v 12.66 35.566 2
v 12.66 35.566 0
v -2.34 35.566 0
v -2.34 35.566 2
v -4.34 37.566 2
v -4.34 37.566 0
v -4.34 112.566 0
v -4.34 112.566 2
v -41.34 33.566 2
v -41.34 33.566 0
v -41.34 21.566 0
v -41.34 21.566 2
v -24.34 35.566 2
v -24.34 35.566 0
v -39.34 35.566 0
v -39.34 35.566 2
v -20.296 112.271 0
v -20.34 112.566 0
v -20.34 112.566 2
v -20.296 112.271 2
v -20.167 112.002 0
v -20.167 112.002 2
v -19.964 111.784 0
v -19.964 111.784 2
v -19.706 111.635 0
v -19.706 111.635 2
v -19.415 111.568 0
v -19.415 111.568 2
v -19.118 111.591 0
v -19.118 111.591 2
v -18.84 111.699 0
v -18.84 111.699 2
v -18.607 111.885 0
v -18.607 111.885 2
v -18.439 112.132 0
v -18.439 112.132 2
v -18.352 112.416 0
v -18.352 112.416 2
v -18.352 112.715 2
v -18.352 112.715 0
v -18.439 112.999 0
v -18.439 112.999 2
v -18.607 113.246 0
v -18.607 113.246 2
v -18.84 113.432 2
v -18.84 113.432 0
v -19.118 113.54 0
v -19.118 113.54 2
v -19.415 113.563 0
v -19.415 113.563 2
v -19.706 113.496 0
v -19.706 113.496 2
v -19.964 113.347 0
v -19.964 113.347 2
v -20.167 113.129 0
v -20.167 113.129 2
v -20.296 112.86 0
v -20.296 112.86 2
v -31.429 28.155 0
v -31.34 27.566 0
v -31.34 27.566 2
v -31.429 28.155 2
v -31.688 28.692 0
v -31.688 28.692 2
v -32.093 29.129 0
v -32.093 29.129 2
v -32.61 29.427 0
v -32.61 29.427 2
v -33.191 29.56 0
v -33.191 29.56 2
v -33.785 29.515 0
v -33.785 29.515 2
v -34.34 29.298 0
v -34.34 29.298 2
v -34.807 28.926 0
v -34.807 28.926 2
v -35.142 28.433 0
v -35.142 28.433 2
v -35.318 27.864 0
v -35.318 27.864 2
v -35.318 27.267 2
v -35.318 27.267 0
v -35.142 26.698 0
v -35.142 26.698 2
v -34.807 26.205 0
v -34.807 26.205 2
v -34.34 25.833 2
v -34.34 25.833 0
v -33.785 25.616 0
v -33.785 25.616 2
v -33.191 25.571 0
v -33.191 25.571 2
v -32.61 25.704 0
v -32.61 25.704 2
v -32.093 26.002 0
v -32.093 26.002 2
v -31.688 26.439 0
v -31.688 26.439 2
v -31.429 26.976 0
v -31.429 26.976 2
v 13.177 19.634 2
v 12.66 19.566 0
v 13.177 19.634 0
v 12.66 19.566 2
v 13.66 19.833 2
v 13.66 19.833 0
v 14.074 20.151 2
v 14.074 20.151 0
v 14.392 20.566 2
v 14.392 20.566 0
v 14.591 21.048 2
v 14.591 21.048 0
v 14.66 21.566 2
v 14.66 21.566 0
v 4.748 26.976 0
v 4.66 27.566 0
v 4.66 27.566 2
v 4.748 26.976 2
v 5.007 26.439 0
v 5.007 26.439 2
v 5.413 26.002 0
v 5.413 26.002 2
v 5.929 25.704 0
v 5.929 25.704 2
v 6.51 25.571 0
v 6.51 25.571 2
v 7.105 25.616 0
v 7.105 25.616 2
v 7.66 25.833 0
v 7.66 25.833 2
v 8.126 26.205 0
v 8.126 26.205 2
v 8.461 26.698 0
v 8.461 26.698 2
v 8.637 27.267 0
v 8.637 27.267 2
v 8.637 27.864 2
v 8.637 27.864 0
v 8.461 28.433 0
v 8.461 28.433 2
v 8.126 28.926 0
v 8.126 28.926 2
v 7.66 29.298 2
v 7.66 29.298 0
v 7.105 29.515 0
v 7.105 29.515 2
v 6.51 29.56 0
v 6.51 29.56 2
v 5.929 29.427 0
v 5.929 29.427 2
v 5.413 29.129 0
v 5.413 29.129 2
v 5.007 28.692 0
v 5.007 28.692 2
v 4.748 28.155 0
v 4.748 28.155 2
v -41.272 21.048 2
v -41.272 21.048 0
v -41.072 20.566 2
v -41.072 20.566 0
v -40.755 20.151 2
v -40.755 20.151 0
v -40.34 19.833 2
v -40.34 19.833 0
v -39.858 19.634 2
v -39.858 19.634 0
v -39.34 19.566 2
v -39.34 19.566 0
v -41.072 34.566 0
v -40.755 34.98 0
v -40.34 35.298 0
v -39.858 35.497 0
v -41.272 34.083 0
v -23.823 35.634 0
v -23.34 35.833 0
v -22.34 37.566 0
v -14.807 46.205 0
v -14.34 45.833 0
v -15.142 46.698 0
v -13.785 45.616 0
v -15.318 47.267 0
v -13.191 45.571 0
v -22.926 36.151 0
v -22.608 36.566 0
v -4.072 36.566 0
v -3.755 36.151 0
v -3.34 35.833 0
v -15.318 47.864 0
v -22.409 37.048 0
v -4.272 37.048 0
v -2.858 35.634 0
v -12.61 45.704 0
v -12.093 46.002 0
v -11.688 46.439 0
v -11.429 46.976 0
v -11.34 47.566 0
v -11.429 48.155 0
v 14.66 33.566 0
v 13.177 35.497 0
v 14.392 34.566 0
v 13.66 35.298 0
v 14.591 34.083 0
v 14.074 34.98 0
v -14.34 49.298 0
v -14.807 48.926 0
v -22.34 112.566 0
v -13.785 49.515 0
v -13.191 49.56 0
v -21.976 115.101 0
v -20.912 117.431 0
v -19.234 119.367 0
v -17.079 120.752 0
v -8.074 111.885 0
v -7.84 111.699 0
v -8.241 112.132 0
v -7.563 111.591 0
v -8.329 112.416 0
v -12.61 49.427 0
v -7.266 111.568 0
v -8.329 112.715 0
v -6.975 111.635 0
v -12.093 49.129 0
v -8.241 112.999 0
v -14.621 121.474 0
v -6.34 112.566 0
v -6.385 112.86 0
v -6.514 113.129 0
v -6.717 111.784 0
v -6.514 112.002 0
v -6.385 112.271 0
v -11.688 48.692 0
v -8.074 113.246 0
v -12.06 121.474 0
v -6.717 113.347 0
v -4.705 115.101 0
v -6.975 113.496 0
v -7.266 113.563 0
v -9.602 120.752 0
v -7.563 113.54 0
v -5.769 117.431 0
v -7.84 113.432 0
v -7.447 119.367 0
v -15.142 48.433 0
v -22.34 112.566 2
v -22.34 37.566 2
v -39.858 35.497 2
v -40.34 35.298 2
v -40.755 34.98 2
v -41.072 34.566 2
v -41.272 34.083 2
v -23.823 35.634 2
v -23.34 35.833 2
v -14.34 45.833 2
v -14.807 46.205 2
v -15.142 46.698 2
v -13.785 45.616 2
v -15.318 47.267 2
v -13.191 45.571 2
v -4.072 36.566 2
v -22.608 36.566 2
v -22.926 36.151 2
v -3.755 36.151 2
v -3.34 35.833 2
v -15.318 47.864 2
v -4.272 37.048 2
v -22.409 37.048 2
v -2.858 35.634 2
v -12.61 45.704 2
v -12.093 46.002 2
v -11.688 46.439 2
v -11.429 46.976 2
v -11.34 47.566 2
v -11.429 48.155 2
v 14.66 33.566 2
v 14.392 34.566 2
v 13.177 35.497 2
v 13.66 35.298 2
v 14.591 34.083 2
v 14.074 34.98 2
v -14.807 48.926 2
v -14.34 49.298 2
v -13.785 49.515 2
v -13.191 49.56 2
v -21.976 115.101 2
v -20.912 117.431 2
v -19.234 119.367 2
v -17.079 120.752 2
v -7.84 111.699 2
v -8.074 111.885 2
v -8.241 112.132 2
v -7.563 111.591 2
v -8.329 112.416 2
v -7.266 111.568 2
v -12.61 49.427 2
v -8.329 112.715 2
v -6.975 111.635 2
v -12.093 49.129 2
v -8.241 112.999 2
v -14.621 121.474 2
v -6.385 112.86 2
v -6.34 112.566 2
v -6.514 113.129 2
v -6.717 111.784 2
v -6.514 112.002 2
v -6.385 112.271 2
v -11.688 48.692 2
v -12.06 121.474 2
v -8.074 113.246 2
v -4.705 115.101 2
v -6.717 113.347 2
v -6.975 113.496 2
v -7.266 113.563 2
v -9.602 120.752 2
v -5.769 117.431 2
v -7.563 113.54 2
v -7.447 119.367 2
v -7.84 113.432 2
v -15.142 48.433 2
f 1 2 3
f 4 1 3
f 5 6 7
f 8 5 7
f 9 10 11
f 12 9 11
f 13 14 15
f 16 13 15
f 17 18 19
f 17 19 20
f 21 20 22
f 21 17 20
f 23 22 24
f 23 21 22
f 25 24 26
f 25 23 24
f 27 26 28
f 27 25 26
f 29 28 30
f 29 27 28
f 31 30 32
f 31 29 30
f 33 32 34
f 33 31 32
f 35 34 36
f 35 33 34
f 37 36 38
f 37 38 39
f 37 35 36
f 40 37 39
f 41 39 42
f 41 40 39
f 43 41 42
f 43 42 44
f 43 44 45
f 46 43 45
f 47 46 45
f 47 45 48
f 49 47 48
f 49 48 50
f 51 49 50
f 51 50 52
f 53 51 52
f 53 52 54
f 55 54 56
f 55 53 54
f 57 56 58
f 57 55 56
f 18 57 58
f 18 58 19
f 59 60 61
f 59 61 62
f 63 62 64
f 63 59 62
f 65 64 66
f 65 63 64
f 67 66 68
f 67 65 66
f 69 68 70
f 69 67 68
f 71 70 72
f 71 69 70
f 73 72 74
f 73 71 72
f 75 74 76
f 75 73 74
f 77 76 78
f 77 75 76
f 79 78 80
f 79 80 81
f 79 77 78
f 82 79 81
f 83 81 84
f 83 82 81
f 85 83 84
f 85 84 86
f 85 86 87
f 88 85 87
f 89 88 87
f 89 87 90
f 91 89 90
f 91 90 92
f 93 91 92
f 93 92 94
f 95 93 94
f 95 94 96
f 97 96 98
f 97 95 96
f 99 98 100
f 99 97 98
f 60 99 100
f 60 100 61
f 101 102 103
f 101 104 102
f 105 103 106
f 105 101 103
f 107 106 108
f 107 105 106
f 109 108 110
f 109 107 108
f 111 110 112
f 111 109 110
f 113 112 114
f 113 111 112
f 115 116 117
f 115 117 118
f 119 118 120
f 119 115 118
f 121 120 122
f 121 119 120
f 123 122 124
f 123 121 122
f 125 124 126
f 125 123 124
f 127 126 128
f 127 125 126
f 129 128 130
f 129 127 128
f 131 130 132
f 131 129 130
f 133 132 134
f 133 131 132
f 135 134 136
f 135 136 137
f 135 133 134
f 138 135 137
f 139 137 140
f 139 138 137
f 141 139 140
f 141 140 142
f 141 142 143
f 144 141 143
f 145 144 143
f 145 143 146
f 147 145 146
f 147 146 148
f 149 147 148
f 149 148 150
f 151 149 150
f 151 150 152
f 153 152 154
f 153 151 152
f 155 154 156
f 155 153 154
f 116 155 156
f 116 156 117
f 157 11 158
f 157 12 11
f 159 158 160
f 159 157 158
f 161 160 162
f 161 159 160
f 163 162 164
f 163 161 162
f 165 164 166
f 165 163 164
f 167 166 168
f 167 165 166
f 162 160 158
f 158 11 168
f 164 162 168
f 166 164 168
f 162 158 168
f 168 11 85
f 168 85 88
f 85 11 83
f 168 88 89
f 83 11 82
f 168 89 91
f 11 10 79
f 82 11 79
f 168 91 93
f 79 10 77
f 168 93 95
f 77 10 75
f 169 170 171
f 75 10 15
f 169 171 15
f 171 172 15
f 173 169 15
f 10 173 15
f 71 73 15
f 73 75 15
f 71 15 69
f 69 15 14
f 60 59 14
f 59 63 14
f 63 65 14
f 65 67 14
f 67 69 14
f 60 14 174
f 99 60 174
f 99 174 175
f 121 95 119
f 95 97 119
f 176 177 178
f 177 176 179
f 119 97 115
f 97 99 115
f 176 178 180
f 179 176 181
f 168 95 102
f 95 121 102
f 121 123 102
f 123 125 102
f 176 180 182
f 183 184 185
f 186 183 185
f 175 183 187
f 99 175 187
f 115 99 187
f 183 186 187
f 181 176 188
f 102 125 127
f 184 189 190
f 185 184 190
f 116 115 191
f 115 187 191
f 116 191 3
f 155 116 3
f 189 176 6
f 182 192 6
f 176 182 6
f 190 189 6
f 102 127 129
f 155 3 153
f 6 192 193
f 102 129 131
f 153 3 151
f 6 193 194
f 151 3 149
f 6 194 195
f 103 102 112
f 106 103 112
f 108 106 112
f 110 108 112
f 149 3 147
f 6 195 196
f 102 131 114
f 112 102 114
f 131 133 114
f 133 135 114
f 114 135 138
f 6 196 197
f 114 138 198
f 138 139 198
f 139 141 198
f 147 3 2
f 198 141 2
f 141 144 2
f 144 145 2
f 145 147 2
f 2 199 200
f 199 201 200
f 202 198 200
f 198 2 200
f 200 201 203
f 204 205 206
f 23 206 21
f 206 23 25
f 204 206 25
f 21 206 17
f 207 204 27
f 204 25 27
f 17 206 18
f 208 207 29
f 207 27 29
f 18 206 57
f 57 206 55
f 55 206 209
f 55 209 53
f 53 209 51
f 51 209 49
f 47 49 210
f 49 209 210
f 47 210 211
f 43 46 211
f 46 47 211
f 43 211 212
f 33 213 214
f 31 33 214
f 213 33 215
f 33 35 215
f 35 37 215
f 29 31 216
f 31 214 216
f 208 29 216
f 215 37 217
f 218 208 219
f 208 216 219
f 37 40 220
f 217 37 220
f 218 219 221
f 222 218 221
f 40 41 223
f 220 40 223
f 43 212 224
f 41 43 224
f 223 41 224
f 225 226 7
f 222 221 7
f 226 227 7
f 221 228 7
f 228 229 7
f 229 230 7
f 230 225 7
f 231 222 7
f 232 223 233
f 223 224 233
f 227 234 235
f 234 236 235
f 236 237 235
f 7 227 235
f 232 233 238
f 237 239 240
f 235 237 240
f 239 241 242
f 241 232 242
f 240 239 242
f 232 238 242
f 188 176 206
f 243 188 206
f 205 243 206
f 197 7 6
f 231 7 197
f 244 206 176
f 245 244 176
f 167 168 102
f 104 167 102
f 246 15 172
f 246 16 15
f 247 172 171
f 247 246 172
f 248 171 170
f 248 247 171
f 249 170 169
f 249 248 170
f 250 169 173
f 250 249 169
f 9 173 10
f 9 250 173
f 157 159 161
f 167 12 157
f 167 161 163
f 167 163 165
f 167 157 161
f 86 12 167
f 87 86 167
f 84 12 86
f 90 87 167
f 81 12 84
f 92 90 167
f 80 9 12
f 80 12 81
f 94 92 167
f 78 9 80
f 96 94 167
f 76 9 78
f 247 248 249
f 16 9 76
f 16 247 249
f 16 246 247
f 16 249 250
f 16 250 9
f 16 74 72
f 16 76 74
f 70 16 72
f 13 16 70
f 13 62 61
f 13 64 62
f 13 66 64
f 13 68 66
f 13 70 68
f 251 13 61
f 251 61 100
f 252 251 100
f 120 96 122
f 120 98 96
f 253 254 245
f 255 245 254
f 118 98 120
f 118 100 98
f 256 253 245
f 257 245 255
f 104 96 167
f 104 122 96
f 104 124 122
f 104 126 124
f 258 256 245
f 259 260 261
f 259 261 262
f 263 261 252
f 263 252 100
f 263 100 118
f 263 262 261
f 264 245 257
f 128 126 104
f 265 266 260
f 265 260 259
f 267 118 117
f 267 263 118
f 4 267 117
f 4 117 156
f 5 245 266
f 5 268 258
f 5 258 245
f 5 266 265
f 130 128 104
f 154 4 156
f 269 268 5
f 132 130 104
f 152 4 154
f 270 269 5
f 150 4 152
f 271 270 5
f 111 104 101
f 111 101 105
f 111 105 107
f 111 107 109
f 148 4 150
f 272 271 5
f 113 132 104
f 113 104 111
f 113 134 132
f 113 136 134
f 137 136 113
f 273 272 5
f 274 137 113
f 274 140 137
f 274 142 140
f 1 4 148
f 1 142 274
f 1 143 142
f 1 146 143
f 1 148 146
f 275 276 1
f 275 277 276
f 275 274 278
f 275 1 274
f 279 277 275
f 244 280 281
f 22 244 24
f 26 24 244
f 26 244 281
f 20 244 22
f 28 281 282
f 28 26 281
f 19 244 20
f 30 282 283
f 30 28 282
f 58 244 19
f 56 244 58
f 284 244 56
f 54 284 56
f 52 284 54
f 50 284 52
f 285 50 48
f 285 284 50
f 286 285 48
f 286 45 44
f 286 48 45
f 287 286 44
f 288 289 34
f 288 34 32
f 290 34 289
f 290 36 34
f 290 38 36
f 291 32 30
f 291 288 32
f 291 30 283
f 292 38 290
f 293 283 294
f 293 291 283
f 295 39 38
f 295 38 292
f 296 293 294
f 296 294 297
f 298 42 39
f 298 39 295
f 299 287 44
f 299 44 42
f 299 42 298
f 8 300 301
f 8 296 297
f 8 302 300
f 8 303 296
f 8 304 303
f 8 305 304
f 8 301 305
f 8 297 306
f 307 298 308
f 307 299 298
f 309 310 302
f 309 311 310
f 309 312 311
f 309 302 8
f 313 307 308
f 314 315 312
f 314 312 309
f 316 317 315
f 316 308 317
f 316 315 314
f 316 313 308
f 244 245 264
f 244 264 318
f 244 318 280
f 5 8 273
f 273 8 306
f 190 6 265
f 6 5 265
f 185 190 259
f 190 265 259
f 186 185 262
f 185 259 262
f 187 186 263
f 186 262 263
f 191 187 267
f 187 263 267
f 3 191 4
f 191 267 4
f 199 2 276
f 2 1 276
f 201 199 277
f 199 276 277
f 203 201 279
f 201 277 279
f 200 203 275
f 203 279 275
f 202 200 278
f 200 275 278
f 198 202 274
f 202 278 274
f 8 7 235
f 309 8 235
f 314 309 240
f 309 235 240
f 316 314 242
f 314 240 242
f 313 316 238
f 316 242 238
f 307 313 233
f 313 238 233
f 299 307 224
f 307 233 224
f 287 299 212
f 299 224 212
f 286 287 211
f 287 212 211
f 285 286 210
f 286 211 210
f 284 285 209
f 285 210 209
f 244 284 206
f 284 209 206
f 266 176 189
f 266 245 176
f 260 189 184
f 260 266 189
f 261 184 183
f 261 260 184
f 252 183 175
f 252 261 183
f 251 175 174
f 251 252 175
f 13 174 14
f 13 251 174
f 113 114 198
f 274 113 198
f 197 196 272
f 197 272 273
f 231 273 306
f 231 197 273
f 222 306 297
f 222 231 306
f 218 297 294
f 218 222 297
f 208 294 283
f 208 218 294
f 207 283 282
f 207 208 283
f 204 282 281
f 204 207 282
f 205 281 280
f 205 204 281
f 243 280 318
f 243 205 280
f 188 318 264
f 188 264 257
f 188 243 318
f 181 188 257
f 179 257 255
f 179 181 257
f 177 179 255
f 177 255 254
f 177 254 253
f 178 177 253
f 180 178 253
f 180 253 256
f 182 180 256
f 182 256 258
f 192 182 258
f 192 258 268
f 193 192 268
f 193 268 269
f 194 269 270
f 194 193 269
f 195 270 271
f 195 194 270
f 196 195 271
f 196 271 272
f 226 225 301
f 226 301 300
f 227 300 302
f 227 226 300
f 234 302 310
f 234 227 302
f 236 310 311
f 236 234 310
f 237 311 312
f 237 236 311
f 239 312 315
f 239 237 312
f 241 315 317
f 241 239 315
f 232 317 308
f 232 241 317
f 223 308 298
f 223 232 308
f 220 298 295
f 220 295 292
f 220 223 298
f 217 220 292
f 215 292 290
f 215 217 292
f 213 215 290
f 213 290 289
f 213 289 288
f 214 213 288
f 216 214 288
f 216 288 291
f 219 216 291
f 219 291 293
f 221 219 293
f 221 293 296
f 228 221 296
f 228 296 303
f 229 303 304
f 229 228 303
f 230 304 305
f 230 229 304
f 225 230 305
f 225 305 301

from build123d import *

# Parameters (mm, degrees)
SKETCH_1_R      = 2
SKETCH_1_R_2    = 1
EXTRUDE_1_DEPTH = 2
FILLET_1_R      = 2


with BuildPart() as part:
    # 草图1 → 凸台-拉伸1 (new body)
    with BuildSketch(Plane.XY):
        with BuildLine():
            Line((-22.340449028, 112.565520938), (-22.340449028, 35.565520938))
            Line((-22.340449028, 35.565520938), (-41.340449028, 35.565520938))
            Line((-41.340449028, 35.565520938), (-41.340449028, 19.565520938))
            Line((-41.340449028, 19.565520938), (14.659550972, 19.565520938))
            Line((14.659550972, 19.565520938), (14.659550972, 35.565520938))
            Line((14.659550972, 35.565520938), (-4.340449028, 35.565520938))
            Line((-4.340449028, 35.565520938), (-4.340449028, 112.565520938))
            ThreePointArc((-4.340449028, 112.565520938), (-13.340449028, 121.565520938), (-22.340449028, 112.565520938))
        make_face()
        with Locations((-33.340449028, 27.565520938)):
            Circle(SKETCH_1_R, mode=Mode.SUBTRACT)
        with Locations(Location((6.659550972, 27.565520938, 0), (0, 0, 180))):
            Circle(SKETCH_1_R, mode=Mode.SUBTRACT)
        with Locations((-7.340449028, 112.565520938)):
            Circle(SKETCH_1_R_2, mode=Mode.SUBTRACT)
        with Locations(Location((-19.340449028, 112.565520938, 0), (0, 0, 180))):
            Circle(SKETCH_1_R_2, mode=Mode.SUBTRACT)
        with Locations((-13.340449028, 47.565520938)):
            Circle(SKETCH_1_R, mode=Mode.SUBTRACT)
    extrude(amount=EXTRUDE_1_DEPTH)

    # 圆角1
    fillet_1_edges = [part.edges().sort_by_distance(p)[0] for p in [
        (-41.340449028, 19.565520938, 1),
        (-41.340449028, 35.565520938, 1),
        (-22.340449028, 35.565520938, 1),
        (-4.340449028, 35.565520938, 1),
        (14.659550972, 35.565520938, 1),
        (14.659550972, 19.565520938, 1),
    ]]
    fillet(fillet_1_edges, radius=FILLET_1_R)


solid = part.part
